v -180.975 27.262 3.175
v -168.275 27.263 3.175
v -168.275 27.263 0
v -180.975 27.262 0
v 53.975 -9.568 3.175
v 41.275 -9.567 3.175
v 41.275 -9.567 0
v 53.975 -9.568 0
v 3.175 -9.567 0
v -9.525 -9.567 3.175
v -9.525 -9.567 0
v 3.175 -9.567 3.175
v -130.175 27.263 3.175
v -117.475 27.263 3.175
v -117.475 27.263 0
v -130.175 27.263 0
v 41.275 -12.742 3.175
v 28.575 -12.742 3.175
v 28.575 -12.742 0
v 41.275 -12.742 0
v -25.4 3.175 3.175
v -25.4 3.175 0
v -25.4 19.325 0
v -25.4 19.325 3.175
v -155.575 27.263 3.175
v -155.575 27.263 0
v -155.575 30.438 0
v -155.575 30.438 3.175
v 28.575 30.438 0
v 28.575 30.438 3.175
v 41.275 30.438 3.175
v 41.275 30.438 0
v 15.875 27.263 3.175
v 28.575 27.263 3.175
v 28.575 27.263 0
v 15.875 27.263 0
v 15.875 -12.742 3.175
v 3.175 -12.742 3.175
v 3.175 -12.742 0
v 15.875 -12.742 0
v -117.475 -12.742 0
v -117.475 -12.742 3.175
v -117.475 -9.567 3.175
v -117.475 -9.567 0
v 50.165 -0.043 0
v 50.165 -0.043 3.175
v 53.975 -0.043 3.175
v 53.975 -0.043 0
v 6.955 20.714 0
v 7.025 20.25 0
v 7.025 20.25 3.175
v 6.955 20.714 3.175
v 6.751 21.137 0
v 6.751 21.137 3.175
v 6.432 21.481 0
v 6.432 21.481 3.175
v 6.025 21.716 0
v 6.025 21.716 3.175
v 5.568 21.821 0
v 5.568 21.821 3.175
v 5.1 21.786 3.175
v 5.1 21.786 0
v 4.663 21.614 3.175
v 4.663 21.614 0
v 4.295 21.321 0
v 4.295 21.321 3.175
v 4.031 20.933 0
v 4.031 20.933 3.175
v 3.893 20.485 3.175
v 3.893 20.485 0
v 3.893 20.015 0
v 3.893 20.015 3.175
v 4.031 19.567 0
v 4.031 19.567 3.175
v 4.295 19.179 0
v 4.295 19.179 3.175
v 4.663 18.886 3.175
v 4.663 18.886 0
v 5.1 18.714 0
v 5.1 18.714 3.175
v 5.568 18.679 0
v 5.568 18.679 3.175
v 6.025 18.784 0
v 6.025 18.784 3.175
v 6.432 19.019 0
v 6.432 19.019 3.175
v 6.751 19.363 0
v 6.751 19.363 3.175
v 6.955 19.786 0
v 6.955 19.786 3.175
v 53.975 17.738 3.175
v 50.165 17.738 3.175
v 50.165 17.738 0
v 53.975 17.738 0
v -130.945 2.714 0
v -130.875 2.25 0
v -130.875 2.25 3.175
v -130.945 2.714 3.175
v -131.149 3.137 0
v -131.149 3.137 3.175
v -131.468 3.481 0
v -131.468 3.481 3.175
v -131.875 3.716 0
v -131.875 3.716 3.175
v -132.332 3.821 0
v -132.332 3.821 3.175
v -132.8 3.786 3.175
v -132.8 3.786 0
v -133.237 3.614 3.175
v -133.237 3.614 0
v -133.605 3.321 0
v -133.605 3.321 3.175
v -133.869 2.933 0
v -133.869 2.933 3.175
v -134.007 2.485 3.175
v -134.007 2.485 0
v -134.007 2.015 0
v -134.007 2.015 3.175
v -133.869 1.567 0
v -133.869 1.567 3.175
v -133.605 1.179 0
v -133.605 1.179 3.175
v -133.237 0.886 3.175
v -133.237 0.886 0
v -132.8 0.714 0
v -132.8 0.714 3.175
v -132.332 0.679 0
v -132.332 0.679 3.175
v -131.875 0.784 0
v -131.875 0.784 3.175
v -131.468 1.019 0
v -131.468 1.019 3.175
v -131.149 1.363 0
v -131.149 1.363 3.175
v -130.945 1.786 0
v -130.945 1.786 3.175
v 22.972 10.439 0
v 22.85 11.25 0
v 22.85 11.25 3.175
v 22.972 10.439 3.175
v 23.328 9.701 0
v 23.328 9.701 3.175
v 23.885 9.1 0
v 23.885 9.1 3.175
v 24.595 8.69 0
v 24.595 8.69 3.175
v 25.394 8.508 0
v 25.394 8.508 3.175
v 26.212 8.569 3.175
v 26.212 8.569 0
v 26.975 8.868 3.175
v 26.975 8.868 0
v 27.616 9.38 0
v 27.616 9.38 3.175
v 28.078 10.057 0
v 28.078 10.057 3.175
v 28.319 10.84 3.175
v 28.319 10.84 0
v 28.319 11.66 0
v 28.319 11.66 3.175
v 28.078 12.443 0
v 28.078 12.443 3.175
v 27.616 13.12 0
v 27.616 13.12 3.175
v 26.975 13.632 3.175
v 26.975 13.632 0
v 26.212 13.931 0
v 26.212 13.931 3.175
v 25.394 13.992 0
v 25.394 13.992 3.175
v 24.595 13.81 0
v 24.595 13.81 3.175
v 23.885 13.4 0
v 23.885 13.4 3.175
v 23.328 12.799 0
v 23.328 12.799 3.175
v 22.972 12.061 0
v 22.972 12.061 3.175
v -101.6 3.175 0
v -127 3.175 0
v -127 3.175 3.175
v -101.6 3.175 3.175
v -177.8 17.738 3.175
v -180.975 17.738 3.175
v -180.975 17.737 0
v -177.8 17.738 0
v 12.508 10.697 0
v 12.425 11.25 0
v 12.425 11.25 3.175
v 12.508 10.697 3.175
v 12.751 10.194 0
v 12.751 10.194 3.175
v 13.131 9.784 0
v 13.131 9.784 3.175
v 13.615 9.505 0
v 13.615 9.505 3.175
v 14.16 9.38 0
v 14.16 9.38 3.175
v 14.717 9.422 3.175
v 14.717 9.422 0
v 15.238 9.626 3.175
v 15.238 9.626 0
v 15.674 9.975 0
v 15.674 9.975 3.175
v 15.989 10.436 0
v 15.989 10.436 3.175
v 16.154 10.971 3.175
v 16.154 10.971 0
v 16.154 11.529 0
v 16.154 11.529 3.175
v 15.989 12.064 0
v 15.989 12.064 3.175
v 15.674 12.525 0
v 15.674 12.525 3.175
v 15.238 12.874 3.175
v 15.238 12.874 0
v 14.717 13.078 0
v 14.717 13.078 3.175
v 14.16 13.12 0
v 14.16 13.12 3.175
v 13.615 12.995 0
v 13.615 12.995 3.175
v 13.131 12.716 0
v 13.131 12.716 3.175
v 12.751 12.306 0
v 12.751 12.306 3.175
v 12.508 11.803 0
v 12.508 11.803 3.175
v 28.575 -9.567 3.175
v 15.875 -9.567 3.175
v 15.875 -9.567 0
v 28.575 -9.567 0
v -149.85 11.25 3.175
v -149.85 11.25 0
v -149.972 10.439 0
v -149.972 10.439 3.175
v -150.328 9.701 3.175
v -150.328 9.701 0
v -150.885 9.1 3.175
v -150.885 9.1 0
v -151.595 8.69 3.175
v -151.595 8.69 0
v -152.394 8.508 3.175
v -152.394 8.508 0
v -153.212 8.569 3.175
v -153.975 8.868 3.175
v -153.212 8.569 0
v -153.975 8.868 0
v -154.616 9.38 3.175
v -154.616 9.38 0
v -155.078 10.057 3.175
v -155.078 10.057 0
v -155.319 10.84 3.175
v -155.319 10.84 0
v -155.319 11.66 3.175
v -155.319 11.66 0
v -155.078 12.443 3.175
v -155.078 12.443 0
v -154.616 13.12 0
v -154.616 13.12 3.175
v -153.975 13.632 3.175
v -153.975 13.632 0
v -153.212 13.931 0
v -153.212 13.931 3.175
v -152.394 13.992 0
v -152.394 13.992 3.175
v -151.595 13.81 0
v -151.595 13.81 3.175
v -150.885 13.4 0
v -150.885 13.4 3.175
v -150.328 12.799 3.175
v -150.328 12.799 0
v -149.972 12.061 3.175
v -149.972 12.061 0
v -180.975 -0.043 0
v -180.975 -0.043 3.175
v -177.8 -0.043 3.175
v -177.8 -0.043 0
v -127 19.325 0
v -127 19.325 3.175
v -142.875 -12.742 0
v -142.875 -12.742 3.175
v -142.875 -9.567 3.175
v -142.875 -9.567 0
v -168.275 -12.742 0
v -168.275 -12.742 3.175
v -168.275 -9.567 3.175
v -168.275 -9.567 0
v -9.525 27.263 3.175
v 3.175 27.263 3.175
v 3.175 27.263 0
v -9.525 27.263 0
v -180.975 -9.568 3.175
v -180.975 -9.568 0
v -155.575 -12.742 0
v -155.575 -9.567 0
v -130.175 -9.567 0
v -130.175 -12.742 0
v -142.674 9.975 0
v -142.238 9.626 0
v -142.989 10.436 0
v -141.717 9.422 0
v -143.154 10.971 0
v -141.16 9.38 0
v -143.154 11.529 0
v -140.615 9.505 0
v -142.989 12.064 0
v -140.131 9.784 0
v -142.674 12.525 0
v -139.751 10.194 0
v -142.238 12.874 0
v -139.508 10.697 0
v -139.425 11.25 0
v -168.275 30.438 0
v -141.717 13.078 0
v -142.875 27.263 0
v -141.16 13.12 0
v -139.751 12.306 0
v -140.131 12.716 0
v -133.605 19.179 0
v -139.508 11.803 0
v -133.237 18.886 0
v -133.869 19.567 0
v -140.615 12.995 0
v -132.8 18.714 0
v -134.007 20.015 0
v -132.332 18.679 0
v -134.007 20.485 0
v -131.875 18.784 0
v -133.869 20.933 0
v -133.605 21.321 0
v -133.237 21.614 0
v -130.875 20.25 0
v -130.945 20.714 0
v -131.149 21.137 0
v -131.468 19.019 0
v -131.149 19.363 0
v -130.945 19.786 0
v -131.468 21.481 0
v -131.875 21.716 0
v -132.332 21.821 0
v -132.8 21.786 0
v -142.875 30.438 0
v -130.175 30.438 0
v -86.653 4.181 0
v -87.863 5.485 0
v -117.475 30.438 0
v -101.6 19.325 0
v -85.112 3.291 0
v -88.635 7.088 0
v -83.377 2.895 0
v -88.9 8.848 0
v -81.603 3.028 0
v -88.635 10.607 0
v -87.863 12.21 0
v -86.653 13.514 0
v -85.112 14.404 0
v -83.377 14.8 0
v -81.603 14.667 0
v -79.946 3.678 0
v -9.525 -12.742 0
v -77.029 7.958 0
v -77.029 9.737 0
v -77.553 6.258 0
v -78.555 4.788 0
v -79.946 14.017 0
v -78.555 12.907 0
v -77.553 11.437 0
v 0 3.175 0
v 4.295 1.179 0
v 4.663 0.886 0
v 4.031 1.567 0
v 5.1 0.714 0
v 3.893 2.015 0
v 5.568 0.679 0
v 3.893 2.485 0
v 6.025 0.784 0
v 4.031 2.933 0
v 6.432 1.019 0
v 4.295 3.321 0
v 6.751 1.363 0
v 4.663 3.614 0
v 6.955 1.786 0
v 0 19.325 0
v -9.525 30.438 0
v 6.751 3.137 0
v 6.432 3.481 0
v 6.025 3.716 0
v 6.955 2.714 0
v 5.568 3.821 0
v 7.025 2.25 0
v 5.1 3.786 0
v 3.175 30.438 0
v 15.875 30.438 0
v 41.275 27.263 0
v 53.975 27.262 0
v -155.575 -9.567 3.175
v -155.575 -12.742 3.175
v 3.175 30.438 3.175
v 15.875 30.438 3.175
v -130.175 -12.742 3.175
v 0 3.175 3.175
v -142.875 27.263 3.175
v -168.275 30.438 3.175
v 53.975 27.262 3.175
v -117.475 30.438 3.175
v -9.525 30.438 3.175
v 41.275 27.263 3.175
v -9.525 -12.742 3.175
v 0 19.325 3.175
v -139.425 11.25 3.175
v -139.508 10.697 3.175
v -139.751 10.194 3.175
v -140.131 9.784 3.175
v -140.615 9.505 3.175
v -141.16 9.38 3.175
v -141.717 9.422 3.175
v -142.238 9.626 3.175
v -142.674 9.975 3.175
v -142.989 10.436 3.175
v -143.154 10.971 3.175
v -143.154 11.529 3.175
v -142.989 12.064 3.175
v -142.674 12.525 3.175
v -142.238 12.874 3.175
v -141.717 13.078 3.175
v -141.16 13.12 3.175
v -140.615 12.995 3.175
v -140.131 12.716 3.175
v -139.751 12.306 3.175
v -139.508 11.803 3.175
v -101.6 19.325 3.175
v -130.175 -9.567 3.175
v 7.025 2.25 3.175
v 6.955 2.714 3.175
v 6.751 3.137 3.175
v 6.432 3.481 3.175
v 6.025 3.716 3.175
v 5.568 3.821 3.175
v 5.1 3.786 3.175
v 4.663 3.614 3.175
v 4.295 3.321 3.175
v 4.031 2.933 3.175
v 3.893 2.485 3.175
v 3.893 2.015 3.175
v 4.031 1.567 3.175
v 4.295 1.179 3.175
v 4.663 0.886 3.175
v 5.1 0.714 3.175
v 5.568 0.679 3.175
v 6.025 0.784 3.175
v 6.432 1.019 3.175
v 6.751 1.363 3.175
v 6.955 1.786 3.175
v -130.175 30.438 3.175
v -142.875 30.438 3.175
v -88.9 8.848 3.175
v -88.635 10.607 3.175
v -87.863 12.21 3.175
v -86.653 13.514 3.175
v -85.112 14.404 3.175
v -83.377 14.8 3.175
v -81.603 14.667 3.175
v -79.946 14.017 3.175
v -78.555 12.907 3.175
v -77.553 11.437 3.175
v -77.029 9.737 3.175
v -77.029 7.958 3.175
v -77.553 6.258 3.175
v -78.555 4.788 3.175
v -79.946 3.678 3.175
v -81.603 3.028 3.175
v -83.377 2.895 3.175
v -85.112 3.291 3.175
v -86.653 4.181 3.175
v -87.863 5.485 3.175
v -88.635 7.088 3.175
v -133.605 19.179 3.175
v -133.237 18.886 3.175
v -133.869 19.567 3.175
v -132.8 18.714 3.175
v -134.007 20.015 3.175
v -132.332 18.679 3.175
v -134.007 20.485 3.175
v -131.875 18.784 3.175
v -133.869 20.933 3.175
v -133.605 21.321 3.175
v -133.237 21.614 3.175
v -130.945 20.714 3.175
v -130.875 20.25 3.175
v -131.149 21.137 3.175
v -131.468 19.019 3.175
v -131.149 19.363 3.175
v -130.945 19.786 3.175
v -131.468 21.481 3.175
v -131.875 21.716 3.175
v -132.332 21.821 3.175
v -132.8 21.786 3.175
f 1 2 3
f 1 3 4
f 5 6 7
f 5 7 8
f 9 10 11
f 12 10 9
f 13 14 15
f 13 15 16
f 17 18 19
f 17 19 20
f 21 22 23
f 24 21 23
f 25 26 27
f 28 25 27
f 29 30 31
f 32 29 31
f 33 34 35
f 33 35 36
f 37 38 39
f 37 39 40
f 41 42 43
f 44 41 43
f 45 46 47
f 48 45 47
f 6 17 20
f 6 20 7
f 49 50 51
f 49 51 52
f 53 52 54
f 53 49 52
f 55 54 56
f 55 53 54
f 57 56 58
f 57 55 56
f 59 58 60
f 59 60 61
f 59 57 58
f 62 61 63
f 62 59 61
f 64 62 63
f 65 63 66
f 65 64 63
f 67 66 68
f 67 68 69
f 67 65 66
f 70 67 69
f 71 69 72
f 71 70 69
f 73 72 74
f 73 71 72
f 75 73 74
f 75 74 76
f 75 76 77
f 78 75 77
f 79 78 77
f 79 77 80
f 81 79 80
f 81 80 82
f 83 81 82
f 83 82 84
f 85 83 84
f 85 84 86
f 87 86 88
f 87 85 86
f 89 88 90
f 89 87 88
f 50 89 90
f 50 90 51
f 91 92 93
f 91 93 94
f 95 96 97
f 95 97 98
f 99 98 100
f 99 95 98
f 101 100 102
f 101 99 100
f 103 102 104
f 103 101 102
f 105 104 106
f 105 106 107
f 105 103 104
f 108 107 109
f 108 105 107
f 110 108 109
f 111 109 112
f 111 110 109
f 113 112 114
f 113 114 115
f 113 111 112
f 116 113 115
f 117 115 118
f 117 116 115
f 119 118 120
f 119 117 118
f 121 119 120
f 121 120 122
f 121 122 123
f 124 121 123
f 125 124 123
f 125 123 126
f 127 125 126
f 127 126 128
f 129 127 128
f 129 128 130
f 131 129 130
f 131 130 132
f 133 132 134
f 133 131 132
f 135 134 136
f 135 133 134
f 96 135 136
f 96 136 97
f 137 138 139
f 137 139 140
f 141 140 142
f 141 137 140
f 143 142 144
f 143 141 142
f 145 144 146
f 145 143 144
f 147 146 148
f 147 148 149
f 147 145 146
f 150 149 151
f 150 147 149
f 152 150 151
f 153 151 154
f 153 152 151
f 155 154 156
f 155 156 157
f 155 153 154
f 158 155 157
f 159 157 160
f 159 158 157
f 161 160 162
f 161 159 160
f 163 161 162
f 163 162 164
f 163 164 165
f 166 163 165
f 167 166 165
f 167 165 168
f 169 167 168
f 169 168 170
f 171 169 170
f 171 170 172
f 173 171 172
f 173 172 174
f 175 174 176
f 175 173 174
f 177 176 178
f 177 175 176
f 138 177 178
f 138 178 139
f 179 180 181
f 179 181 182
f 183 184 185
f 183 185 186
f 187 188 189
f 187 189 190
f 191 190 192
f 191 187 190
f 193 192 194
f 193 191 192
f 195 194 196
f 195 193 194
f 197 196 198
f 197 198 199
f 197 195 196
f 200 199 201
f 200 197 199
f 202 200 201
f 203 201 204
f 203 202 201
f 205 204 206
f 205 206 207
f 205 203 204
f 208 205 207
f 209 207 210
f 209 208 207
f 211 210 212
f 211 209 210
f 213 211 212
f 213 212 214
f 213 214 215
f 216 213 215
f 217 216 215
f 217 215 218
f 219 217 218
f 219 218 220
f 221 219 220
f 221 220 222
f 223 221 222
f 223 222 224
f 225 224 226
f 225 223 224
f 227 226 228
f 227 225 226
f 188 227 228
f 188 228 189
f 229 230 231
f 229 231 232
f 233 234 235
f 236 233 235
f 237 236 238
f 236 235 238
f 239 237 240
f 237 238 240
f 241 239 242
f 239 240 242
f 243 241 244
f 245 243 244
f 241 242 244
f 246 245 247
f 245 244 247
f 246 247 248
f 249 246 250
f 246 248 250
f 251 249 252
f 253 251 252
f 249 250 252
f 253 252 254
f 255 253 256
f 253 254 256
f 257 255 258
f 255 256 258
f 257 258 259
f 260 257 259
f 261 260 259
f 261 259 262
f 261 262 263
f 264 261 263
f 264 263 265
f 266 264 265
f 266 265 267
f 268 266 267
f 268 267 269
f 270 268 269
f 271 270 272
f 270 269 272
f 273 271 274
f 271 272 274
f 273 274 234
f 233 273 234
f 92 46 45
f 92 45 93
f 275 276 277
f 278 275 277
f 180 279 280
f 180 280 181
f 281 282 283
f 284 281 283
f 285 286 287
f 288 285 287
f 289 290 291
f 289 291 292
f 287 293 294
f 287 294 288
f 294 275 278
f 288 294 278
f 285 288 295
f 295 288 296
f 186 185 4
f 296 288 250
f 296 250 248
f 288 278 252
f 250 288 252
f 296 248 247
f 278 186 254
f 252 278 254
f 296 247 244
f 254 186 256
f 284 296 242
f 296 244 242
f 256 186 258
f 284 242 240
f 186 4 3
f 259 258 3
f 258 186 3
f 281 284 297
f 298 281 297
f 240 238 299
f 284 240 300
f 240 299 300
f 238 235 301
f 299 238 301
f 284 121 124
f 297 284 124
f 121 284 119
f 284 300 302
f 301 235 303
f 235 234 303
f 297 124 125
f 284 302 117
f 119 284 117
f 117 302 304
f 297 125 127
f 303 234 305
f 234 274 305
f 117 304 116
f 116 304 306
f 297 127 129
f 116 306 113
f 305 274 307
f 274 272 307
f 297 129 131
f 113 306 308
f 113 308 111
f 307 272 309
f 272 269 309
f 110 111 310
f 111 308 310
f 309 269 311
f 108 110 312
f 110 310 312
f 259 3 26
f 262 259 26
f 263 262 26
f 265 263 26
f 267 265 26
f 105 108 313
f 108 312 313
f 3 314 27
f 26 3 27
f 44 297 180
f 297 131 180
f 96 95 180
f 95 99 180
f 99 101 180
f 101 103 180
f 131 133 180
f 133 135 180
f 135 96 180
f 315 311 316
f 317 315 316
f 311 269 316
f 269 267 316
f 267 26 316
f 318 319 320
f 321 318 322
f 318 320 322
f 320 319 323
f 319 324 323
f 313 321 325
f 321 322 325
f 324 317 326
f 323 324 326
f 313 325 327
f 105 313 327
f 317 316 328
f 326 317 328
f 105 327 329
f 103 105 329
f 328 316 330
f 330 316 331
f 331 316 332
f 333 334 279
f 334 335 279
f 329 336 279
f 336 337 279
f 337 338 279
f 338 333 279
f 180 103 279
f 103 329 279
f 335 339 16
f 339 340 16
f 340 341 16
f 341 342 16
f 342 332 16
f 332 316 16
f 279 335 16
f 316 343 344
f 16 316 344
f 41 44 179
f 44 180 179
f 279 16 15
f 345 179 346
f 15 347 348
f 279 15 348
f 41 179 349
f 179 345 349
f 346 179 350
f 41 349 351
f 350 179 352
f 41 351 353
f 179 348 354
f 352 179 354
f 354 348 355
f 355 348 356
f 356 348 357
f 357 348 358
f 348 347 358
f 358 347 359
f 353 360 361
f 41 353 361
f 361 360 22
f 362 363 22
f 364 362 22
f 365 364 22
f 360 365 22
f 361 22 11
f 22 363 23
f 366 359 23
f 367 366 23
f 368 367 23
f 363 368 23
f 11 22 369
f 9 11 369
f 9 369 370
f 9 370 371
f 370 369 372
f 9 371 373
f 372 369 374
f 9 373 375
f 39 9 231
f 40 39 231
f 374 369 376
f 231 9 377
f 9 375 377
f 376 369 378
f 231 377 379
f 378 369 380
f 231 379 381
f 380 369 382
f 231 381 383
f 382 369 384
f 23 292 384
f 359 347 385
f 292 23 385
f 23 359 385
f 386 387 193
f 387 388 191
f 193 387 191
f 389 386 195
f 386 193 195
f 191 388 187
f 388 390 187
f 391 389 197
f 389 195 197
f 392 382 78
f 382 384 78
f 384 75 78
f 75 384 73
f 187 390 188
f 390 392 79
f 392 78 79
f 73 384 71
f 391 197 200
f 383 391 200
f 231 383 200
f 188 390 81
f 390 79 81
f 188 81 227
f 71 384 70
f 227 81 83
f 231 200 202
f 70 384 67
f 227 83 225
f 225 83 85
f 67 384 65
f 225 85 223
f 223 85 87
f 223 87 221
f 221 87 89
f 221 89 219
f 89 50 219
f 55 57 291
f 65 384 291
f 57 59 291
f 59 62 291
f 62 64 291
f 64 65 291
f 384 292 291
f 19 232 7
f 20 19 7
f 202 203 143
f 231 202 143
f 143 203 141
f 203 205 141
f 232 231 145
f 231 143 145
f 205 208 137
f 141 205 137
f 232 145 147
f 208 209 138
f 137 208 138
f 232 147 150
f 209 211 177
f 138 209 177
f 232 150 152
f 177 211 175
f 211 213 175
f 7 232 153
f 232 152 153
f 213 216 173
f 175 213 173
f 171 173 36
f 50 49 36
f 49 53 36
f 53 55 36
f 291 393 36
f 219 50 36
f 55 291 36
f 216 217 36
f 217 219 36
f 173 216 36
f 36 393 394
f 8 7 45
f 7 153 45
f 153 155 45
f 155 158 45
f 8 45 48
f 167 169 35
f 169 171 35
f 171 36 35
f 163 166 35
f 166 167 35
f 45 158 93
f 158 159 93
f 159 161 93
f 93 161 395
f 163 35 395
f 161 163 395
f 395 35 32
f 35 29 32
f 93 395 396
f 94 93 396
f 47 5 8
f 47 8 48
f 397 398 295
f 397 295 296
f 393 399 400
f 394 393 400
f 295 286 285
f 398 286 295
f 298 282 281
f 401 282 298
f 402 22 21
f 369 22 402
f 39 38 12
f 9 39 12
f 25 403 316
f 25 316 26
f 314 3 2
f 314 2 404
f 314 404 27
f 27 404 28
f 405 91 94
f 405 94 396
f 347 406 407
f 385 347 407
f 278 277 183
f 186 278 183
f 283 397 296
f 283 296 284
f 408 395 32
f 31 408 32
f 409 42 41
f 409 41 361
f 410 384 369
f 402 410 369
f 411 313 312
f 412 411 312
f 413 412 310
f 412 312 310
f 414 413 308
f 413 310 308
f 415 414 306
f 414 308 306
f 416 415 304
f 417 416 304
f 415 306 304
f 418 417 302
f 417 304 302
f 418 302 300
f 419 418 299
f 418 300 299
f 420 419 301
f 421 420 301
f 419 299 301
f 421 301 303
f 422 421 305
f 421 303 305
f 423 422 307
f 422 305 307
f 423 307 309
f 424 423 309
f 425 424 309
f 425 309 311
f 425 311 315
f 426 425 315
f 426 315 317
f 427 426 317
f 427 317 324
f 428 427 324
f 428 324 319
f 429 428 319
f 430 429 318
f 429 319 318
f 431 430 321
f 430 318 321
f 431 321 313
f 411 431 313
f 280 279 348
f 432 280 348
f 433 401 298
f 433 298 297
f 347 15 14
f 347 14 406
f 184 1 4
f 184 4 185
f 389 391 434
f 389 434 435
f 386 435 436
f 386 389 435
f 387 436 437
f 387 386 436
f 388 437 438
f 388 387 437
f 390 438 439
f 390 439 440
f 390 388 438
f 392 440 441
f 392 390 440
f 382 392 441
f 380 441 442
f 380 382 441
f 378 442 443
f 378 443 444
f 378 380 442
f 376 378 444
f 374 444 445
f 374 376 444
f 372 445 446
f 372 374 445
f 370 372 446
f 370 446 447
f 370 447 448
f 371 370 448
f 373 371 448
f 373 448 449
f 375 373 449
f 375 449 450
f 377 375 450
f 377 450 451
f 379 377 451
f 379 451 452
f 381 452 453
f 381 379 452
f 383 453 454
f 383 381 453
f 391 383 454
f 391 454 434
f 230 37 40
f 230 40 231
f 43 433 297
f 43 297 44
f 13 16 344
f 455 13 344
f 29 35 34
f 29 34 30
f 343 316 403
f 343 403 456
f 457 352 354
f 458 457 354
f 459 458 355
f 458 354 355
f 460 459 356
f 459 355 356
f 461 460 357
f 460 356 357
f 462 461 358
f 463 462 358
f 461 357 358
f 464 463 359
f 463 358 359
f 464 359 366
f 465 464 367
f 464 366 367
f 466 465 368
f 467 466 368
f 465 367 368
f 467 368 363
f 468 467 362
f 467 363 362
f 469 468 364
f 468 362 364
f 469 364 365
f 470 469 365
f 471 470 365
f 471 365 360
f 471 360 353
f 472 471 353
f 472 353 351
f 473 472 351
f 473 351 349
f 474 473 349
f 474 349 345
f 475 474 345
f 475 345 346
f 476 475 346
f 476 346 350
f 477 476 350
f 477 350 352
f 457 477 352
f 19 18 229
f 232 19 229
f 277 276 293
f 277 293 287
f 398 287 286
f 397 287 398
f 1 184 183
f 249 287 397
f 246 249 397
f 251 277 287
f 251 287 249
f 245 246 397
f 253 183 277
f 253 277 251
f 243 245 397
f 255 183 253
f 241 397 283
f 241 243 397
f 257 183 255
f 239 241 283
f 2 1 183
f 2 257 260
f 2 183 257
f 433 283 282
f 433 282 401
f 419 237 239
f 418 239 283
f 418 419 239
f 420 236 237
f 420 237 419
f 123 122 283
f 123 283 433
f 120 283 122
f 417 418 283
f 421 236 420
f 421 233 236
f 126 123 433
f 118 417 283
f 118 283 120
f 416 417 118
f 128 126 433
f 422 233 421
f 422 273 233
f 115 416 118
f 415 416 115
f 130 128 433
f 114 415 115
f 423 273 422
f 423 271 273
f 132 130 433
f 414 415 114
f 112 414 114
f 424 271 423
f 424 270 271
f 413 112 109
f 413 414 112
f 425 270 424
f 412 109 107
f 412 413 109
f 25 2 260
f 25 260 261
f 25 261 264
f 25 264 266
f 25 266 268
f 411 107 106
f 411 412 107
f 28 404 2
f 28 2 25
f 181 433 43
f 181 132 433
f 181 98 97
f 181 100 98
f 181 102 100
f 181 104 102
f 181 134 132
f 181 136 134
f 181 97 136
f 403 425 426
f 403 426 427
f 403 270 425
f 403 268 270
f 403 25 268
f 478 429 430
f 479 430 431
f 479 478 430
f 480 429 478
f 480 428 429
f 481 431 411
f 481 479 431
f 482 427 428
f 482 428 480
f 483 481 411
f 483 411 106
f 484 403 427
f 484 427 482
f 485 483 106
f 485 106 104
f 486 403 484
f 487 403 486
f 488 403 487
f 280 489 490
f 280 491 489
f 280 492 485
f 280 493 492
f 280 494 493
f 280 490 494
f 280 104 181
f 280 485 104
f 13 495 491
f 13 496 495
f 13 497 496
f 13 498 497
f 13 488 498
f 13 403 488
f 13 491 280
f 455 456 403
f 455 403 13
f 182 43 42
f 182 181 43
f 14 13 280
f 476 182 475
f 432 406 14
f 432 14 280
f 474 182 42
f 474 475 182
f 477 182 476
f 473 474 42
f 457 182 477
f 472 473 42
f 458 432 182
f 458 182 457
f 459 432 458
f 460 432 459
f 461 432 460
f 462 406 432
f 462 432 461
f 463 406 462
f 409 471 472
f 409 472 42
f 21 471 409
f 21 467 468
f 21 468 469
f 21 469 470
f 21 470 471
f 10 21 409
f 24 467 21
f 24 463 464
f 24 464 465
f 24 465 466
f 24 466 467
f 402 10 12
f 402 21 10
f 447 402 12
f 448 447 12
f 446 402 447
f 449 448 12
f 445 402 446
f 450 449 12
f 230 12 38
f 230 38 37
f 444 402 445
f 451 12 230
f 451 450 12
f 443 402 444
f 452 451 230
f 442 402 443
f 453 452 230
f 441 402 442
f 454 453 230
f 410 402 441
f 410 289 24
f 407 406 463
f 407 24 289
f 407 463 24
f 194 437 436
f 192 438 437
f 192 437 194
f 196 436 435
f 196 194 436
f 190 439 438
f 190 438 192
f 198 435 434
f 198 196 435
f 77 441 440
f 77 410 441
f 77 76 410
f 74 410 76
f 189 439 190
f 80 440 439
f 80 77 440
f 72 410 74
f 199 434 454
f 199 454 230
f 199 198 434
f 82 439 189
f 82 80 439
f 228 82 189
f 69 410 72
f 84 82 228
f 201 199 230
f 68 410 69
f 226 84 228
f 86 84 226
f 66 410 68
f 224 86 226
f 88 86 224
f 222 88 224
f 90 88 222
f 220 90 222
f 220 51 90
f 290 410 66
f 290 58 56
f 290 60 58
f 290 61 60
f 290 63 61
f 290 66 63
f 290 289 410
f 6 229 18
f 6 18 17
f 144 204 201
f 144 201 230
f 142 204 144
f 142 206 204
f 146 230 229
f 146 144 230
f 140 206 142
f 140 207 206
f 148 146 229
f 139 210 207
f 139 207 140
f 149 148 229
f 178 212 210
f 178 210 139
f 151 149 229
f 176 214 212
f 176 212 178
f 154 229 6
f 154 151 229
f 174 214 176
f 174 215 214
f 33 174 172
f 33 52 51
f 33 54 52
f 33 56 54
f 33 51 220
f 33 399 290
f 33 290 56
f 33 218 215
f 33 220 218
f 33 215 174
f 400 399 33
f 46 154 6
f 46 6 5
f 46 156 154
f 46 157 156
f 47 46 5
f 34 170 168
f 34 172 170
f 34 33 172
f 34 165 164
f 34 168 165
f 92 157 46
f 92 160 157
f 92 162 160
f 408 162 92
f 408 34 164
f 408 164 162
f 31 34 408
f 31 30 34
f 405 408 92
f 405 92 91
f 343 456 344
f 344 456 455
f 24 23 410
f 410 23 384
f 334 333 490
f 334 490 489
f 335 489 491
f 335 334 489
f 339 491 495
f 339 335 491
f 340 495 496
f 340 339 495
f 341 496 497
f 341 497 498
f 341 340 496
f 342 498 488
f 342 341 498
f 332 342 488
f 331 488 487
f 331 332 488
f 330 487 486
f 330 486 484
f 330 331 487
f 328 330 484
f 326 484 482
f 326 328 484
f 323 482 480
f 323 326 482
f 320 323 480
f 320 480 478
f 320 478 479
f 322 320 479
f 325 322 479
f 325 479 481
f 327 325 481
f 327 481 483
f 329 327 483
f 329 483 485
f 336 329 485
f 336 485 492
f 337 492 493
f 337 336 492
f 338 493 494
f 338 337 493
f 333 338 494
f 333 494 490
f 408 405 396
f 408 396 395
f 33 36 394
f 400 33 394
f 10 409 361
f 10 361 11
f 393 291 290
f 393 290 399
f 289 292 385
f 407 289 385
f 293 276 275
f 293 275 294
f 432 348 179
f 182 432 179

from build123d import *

# Parameters (mm, degrees)
SKETCH3_W           = 234.95
SKETCH3_H           = 30.48
SKETCH3_R           = 1.574999898
SKETCH3_W_2         = 25.4
SKETCH3_H_2         = 3.175
BOSS_EXTRUDE1_DEPTH = 3.175
SKETCH4_W           = 107.95
SKETCH4_H           = 3.175
SKETCH4_W_2         = 12.7
BOSS_EXTRUDE2_DEPTH = 3.175
SKETCH5_W           = 3.175
SKETCH5_H           = 17.78
SKETCH5_W_2         = 3.81
CUT_EXTRUDE1_DEPTH  = 7.62
SKETCH6_R           = 5.969
CUT_EXTRUDE2_DEPTH  = 5.08


with BuildPart() as part:
    # Sketch3 → Boss-Extrude1 (new body)
    # profile 1 of 7: a face of its own
    with BuildSketch(Plane.XY):
        with Locations((-63.5, 8.8475)):
            Rectangle(SKETCH3_W, SKETCH3_H)
        with BuildLine():
            ThreePointArc((-163.6, 17.5), (-162.135533906, 21.035533906), (-158.6, 22.5))
            Line((-158.6, 22.5), (-127, 22.5))
            Line((-127, 22.5), (-101.6, 22.5))
            Line((-101.6, 22.5), (-101.6, 19.325))
            Line((-101.6, 19.325), (-101.6, 3.175))
            Line((-101.6, 3.175), (-101.6, 0))
            Line((-101.6, 0), (-127, 0))
            Line((-127, 0), (-158.6, 0))
            ThreePointArc((-158.6, 0), (-162.135533906, 1.464466094), (-163.6, 5))
            Line((-163.6, 5), (-163.6, 17.5))
        make_face(mode=Mode.SUBTRACT)
        with BuildLine():
            Line((-25.4, 22.5), (0, 22.5))
            Line((0, 22.5), (31.6, 22.5))
            ThreePointArc((31.6, 22.5), (35.135533906, 21.035533906), (36.6, 17.5))
            Line((36.6, 17.5), (36.6, 5))
            ThreePointArc((36.6, 5), (35.135533906, 1.464466094), (31.6, 0))
            Line((31.6, 0), (0, 0))
            Line((0, 0), (-25.4, 0))
            Line((-25.4, 0), (-25.4, 3.175))
            Line((-25.4, 3.175), (-25.4, 19.325))
            Line((-25.4, 19.325), (-25.4, 22.5))
        make_face(mode=Mode.SUBTRACT)
    # profile 2 of 7: a face of its own
    with BuildSketch(Plane.XY):
        with BuildLine():
            ThreePointArc((-158.6, 0), (-162.135533906, 1.464466094), (-163.6, 5))
            Line((-163.6, 5), (-163.6, 17.5))
            ThreePointArc((-163.6, 17.5), (-162.135533906, 21.035533906), (-158.6, 22.5))
            Line((-158.6, 22.5), (-127, 22.5))
            Line((-127, 22.5), (-127, 0))
            Line((-127, 0), (-158.6, 0))
        make_face()
        with Locations((-132.45, 20.25)):
            Circle(SKETCH3_R, mode=Mode.SUBTRACT)
        with Locations((-132.45, 2.250000072)):
            Circle(SKETCH3_R, mode=Mode.SUBTRACT)
        with BuildLine():
            ThreePointArc((-143.175, 11.25), (-141.3, 13.125), (-139.425, 11.25))
            ThreePointArc((-139.425, 11.25), (-141.3, 9.375), (-143.175, 11.25))
        make_face(mode=Mode.SUBTRACT)
        with BuildLine():
            ThreePointArc((-155.35, 11.25), (-152.6, 14), (-149.85, 11.25))
            ThreePointArc((-149.85, 11.25), (-152.6, 8.5), (-155.35, 11.25))
        make_face(mode=Mode.SUBTRACT)
    # profile 3 of 7: a face of its own
    with BuildSketch(Plane.XY):
        with BuildLine():
            Line((36.6, 5), (36.6, 17.5))
            ThreePointArc((36.6, 17.5), (35.135533906, 21.035533906), (31.6, 22.5))
            Line((31.6, 22.5), (0, 22.5))
            Line((0, 22.5), (0, 0))
            Line((0, 0), (31.6, 0))
            ThreePointArc((31.6, 0), (35.135533906, 1.464466094), (36.6, 5))
        make_face()
        with Locations((5.45, 2.250000072)):
            Circle(SKETCH3_R, mode=Mode.SUBTRACT)
        with Locations((5.45, 20.25)):
            Circle(SKETCH3_R, mode=Mode.SUBTRACT)
        with BuildLine():
            ThreePointArc((16.175, 11.25), (14.3, 13.125), (12.425, 11.25))
            ThreePointArc((12.425, 11.25), (14.3, 9.375), (16.175, 11.25))
        make_face(mode=Mode.SUBTRACT)
        with BuildLine():
            ThreePointArc((28.35, 11.25), (25.6, 14), (22.85, 11.25))
            ThreePointArc((22.85, 11.25), (25.6, 8.5), (28.35, 11.25))
        make_face(mode=Mode.SUBTRACT)
    # profile 4 of 7: a face of its own
    with BuildSketch(Plane.XY):
        with Locations((-12.7, 1.5875)):
            Rectangle(SKETCH3_W_2, SKETCH3_H_2)
    # profile 5 of 7: a face of its own
    with BuildSketch(Plane.XY):
        with Locations((-12.7, 20.9125)):
            Rectangle(SKETCH3_W_2, SKETCH3_H_2)
    # profile 6 of 7: a face of its own
    with BuildSketch(Plane.XY):
        with Locations((-114.3, 20.9125)):
            Rectangle(SKETCH3_W_2, SKETCH3_H_2)
    # profile 7 of 7: a face of its own
    with BuildSketch(Plane.XY):
        with Locations((-114.3, 1.5875)):
            Rectangle(SKETCH3_W_2, SKETCH3_H_2)
    extrude(amount=BOSS_EXTRUDE1_DEPTH)

    # Sketch4 → Boss-Extrude2 (add)
    with BuildSketch(Plane.XY.offset(3.175)):
        with Locations((-63.5, 28.85)):
            Rectangle(SKETCH4_W, SKETCH4_H)
        with Locations((-136.525, 28.85)):
            Rectangle(SKETCH4_W_2, SKETCH4_H)
        with Locations((-161.925, 28.85)):
            Rectangle(SKETCH4_W_2, SKETCH4_H)
        Polygon((-142.875, 27.2625), (-155.575, 27.2625), (-168.275, 27.2625), (-180.975, 27.2625), (-180.975, 24.0875), (53.975, 24.0875), (53.975, 27.2625), (41.275, 27.2625), (28.575, 27.2625), (15.875, 27.2625), (3.175, 27.2625), (-9.525, 27.2625), (-117.475, 27.2625), (-130.175, 27.2625), align=None)
        with Locations((9.525, 28.85)):
            Rectangle(SKETCH4_W_2, SKETCH4_H)
        with Locations((34.925, 28.85)):
            Rectangle(SKETCH4_W_2, SKETCH4_H)
        Polygon((53.975, -6.3925), (-180.975, -6.3925), (-180.975, -9.5675), (-168.275, -9.5675), (-155.575, -9.5675), (-142.875, -9.5675), (-130.175, -9.5675), (-117.475, -9.5675), (-9.525, -9.5675), (3.175, -9.5675), (15.875, -9.5675), (28.575, -9.5675), (41.275, -9.5675), (53.975, -9.5675), align=None)
        with Locations((34.925, -11.155)):
            Rectangle(SKETCH4_W_2, SKETCH4_H)
        with Locations((9.525, -11.155)):
            Rectangle(SKETCH4_W_2, SKETCH4_H)
        with Locations((-63.5, -11.155)):
            Rectangle(SKETCH4_W, SKETCH4_H)
        with Locations((-136.525, -11.155)):
            Rectangle(SKETCH4_W_2, SKETCH4_H)
        with Locations((-161.925, -11.155)):
            Rectangle(SKETCH4_W_2, SKETCH4_H)
    extrude(amount=-BOSS_EXTRUDE2_DEPTH)

    # Sketch5 → Cut-Extrude1 (cut)
    with BuildSketch(Plane.XY.offset(3.175)):
        with Locations((-179.3875, 8.8475)):
            Rectangle(SKETCH5_W, SKETCH5_H)
        with Locations((52.07, 8.8475)):
            Rectangle(SKETCH5_W_2, SKETCH5_H)
    extrude(amount=-CUT_EXTRUDE1_DEPTH, mode=Mode.SUBTRACT)

    # Sketch6 → Cut-Extrude2 (cut)
    with BuildSketch(Plane(origin=(0, 0, 0), x_dir=(-1, 0, 0), z_dir=(0, 0, -1))):
        with Locations((82.931, 8.8475)):
            Circle(SKETCH6_R)
    extrude(amount=-CUT_EXTRUDE2_DEPTH, mode=Mode.SUBTRACT)


solid = part.part
